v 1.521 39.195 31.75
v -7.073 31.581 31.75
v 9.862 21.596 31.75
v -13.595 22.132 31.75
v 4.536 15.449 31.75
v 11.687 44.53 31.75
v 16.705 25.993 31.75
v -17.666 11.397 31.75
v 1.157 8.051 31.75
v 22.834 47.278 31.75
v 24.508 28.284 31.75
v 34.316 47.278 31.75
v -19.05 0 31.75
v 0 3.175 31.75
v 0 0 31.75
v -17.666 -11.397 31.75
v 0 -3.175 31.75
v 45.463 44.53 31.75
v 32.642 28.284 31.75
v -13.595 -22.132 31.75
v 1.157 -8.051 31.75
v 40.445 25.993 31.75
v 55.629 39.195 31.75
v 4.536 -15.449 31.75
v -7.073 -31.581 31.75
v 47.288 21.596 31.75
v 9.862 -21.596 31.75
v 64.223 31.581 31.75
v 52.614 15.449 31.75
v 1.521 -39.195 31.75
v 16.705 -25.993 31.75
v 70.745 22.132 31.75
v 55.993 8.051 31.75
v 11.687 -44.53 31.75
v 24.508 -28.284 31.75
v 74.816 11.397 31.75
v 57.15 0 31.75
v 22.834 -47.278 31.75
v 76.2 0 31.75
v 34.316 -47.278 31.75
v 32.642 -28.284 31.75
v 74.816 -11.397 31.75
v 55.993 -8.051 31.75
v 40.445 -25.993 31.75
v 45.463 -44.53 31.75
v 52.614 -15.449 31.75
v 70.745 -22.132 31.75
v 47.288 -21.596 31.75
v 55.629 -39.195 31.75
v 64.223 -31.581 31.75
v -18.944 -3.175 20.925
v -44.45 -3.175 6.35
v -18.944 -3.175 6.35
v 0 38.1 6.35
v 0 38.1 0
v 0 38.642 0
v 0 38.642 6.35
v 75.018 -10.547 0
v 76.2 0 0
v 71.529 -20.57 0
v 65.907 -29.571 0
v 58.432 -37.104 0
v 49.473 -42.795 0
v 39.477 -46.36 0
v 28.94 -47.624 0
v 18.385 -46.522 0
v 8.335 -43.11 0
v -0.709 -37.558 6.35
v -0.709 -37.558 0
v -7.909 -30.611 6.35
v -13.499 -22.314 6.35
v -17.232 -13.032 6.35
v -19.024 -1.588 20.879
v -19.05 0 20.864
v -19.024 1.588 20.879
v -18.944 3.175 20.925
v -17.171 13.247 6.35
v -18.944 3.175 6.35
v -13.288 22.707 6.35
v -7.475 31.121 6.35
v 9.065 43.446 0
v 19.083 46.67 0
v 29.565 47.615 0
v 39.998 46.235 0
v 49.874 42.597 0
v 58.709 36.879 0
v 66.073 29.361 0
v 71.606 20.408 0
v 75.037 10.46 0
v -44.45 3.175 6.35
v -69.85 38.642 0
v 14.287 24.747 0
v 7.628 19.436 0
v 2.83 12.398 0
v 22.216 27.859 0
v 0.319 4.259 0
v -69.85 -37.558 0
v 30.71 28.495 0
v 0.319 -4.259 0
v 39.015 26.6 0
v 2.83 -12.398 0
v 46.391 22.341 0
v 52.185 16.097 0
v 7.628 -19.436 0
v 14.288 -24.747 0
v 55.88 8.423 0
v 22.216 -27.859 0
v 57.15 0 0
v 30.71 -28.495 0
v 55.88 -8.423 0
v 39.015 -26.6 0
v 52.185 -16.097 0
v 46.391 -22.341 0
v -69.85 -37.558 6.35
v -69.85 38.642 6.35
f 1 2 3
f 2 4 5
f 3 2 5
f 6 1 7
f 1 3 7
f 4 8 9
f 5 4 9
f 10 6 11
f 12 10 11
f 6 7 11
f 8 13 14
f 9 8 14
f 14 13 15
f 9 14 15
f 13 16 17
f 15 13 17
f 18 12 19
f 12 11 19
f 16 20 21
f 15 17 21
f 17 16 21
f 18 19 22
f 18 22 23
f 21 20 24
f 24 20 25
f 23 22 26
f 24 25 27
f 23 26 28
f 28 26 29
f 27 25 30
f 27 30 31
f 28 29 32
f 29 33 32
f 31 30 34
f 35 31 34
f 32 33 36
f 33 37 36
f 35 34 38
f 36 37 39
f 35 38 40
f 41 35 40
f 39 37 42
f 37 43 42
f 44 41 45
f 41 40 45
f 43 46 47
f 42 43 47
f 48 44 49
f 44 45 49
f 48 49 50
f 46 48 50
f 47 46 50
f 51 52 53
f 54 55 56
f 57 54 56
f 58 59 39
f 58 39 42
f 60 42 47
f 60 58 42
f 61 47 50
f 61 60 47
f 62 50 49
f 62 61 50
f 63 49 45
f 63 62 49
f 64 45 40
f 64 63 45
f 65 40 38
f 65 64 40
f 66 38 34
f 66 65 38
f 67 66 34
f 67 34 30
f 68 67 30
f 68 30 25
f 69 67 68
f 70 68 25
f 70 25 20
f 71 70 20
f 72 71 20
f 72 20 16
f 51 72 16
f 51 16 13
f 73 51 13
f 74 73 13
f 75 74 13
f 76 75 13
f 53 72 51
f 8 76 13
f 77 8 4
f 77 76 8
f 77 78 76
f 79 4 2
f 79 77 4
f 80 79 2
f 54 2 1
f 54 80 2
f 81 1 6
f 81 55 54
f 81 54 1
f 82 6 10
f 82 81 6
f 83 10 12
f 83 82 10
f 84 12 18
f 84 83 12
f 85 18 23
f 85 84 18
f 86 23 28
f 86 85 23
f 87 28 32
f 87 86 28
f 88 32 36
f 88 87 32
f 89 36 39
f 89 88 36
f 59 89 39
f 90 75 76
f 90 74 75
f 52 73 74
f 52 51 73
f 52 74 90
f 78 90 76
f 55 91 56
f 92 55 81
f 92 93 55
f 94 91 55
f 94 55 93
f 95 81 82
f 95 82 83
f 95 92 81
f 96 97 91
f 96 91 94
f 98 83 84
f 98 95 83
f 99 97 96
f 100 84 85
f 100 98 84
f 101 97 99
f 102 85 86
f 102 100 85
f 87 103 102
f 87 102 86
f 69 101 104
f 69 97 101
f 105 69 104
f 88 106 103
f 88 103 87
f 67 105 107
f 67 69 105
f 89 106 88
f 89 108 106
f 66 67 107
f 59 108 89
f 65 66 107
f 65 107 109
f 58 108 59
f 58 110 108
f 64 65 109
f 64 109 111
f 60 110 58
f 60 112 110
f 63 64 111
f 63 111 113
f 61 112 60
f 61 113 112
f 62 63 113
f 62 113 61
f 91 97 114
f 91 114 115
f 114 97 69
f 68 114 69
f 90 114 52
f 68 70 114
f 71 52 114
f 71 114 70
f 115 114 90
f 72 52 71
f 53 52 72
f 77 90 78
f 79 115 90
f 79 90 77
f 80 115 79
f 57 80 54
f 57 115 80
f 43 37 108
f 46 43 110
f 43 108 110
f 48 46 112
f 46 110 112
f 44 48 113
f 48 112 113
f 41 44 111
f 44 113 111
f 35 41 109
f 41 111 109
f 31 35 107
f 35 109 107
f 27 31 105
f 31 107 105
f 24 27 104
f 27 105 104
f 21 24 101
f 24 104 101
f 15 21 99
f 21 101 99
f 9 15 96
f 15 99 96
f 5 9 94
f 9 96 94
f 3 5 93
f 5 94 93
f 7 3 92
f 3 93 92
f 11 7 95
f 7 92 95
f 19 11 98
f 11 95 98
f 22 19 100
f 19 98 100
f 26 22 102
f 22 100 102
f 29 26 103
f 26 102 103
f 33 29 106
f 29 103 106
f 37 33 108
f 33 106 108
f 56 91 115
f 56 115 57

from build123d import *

# Parameters (mm, degrees)
F0_W     = 69.85
F0_H     = 76.2
F1_DEPTH = 6.35
F3_DEPTH = 3.175
F4_R     = 47.625
F4_R_2   = 28.575
F5_DEPTH = 31.75


with BuildPart() as f1:
    # F0 (on Top) → F1 (new body)
    with BuildSketch(Plane.XY):
        with Locations((-34.925, 0.542263)):
            Rectangle(F0_W, F0_H)
    extrude(amount=F1_DEPTH)

    # F2 (on Front) → F3 (join, symmetric)
    with BuildSketch(Plane.XZ):
        Polygon((-44.45, 6.35), (0, 6.35), (0, 31.75), align=None)
    extrude(amount=F3_DEPTH, both=True)

    # F4 (on face) → F5 (join)
    with BuildSketch(Plane(origin=(0, 0, 0), x_dir=(1, 0, 0), z_dir=(0, 0, -1))):
        with Locations((28.575, 0)):
            Circle(F4_R)
        with Locations((28.575, 0)):
            Circle(F4_R_2, mode=Mode.SUBTRACT)
    extrude(amount=-F5_DEPTH)


solid = f1.part
